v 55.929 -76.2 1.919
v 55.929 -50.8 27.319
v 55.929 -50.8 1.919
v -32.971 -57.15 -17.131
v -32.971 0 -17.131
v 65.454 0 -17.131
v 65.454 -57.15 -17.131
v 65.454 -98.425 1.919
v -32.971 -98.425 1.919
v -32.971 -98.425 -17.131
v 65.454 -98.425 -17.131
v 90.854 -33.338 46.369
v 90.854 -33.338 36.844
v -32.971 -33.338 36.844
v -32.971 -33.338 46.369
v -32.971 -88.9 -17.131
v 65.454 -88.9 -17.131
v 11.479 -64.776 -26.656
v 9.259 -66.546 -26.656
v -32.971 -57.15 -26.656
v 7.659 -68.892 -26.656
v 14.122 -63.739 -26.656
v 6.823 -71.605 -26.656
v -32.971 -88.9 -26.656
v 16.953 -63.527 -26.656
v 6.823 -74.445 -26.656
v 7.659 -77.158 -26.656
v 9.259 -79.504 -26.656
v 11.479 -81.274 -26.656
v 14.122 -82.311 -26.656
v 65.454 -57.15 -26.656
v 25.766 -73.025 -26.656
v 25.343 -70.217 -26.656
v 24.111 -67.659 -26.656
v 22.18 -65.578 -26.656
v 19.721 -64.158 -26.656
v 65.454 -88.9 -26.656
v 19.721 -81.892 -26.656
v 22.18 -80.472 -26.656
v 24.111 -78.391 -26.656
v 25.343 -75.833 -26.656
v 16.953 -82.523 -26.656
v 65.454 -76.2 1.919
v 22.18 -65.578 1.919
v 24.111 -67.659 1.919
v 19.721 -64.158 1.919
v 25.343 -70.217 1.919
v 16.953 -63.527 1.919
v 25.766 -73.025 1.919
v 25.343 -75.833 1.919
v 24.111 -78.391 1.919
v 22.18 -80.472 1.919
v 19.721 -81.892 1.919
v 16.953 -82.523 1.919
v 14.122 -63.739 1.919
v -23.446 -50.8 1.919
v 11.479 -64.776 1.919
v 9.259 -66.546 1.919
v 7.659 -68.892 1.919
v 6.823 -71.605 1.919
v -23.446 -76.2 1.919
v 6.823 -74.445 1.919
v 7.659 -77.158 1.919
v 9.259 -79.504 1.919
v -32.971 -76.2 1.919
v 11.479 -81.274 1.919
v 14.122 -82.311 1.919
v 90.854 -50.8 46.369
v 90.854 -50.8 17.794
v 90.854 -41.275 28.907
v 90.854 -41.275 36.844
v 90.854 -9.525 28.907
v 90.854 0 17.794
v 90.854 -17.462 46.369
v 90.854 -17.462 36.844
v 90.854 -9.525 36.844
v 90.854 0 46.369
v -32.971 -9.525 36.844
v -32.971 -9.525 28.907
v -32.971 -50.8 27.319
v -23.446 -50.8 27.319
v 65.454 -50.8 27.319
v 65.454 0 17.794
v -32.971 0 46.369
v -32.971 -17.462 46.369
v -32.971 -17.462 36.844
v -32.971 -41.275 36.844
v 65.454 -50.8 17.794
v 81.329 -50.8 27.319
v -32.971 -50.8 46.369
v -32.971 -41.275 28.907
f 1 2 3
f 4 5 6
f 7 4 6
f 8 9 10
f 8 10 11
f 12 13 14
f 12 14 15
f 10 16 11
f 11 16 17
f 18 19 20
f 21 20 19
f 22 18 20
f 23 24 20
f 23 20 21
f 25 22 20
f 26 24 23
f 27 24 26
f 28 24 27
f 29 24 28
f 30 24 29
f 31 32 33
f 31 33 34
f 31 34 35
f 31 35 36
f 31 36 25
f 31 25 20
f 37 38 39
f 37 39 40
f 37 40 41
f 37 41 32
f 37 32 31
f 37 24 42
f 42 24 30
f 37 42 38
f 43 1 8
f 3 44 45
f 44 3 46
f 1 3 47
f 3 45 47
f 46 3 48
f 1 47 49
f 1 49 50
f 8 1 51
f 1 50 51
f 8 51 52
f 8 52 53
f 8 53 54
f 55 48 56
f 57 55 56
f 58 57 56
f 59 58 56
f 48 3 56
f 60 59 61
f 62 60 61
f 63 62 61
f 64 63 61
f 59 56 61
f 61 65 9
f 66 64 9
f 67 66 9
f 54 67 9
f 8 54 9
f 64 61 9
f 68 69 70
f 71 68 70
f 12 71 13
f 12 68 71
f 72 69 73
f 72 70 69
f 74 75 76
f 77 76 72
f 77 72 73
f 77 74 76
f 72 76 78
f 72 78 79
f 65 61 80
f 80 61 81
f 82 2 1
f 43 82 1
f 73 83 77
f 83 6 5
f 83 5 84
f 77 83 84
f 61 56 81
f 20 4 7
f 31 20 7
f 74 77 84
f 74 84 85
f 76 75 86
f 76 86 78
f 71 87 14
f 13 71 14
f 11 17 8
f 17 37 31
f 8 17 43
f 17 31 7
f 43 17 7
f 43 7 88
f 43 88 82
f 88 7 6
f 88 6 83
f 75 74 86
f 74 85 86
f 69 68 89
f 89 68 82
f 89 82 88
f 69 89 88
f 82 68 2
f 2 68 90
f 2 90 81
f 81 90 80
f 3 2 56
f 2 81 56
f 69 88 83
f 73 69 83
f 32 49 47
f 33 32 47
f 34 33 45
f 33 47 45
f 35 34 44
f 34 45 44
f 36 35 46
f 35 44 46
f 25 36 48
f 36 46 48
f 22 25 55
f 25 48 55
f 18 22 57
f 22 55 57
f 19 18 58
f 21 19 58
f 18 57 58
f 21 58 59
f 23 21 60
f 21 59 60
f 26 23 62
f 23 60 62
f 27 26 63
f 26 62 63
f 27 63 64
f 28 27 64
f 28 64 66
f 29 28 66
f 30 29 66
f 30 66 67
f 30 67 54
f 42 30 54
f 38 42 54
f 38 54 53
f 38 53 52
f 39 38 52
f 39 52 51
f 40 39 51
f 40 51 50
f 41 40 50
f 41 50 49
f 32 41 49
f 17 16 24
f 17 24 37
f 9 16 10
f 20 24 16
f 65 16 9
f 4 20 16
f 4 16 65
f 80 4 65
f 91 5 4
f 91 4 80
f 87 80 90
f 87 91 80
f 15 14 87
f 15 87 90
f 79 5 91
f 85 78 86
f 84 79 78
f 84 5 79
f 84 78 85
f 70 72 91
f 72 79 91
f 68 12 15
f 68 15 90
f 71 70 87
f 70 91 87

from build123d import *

# Parameters (mm, degrees)
F0_W      = 98.425
F0_H      = 19.05
F1_DEPTH  = 98.425
F2_W      = 98.425
F2_H      = 31.75
F3_DEPTH  = 9.525
F5_DEPTH  = 58.928
F6_W      = 98.425
F6_H      = 50.8
F7_DEPTH  = 44.45
F8_W      = 98.425
F8_H      = 15.875
F9_DEPTH  = 17.4625
F10_W     = 7.9375
F10_H     = 7.9375
F11_DEPTH = 104.394
F13_DEPTH = 25.4
F14_W     = 9.525
F14_H     = 25.4
F15_DEPTH = 31.242
F17_DEPTH = 25.4
F19_DEPTH = 39.878
F21_DEPTH = 25.4


with BuildPart() as f1:
    # F0 (on Front) → F1 (new body)
    with BuildSketch(Plane.XZ):
        with Locations((16.241223073, -7.6058536083)):
            Rectangle(F0_W, F0_H)
    extrude(amount=F1_DEPTH)

    # F2 (on face) → F3 (join)
    with BuildSketch(Plane(origin=(0, 0, -17.1308536083), x_dir=(1, 0, 0), z_dir=(0, 0, -1))):
        with Locations((16.241223073, 73.025)):
            Rectangle(F2_W, F2_H)
    extrude(amount=F3_DEPTH)

    # F4 (on face) → F5 (cut)
    with BuildSketch(Plane.XY.offset(1.9191463917)):
        with BuildLine():
            ThreePointArc((16.241223073, -82.55), (22.9764151638, -79.7601920908), (25.766223073, -73.025))
            ThreePointArc((25.766223073, -73.025), (9.5060309822, -66.2898079092), (16.241223073, -82.55))
        make_face()
    extrude(amount=-F5_DEPTH, mode=Mode.SUBTRACT)

    # F6 (on face) → F7 (join)
    with BuildSketch(Plane.XY.offset(1.9191463917)):
        with Locations((16.241223073, -25.4)):
            Rectangle(F6_W, F6_H)
    extrude(amount=F7_DEPTH)

    # F8 (on face) → F9 (cut)
    with BuildSketch(Plane.XY.offset(46.3691463917)):
        with Locations((16.241223073, -25.4)):
            Rectangle(F8_W, F8_H)
    extrude(amount=-F9_DEPTH, mode=Mode.SUBTRACT)

    # F10 (on face) → F11 (cut)
    with BuildSketch(Plane(origin=(-32.971276927, 0, 0), x_dir=(0, -1, 0), z_dir=(-1, 0, 0))):
        with Locations((13.49375, 32.8753963917)):
            Rectangle(F10_W, F10_H)
        with Locations((37.30625, 32.8753963917)):
            Rectangle(F10_W, F10_H)
    extrude(amount=-F11_DEPTH, mode=Mode.SUBTRACT)

    # F12 (on face) → F13 (join)
    with BuildSketch(Plane.YZ.offset(65.453723073)):
        Polygon((-33.3375, 46.3691463917), (-50.8, 46.3691463917), (-50.8, 17.7941463917), (0, 17.7941463917), (0, 46.3691463917), (-17.4625, 46.3691463917), (-17.4625, 36.8441463917), (-9.525, 36.8441463917), (-9.525, 28.9066463917), (-41.275, 28.9066463917), (-41.275, 36.8441463917), (-33.3375, 36.8441463917), align=None)
    extrude(amount=F13_DEPTH)

    # F14 (on face) → F15 (join)
    with BuildSketch(Plane.XZ.offset(50.8)):
        with Locations((-28.208776927, 14.6191463917)):
            Rectangle(F14_W, F14_H)
    extrude(amount=F15_DEPTH)

    # F16 (on face) → F17 (cut)
    with BuildSketch(Plane.YZ.offset(-23.446276927)):
        Polygon((-76.2, 1.9191463917), (-50.8, 27.3191463917), (-82.042, 27.3191463917), (-82.042, 1.9191463917), align=None)
    extrude(amount=-F17_DEPTH, mode=Mode.SUBTRACT)

    # F18 (on face) → F19 (join)
    with BuildSketch(Plane.XZ.offset(50.8)):
        Polygon((55.928723073, 1.9191463917), (65.453723073, 1.9191463917), (65.453723073, 17.7941463917), (65.453723073, 27.3191463917), (55.928723073, 27.3191463917), align=None)
    extrude(amount=F19_DEPTH)

    # F20 (on face) → F21 (cut)
    with BuildSketch(Plane(origin=(55.928723073, 0, 0), x_dir=(0, -1, 0), z_dir=(-1, 0, 0))):
        Polygon((90.678, 27.3191463917), (50.8, 27.3191463917), (76.2, 1.9191463917), (90.678, 1.9191463917), align=None)
    extrude(amount=-F21_DEPTH, mode=Mode.SUBTRACT)


solid = f1.part
